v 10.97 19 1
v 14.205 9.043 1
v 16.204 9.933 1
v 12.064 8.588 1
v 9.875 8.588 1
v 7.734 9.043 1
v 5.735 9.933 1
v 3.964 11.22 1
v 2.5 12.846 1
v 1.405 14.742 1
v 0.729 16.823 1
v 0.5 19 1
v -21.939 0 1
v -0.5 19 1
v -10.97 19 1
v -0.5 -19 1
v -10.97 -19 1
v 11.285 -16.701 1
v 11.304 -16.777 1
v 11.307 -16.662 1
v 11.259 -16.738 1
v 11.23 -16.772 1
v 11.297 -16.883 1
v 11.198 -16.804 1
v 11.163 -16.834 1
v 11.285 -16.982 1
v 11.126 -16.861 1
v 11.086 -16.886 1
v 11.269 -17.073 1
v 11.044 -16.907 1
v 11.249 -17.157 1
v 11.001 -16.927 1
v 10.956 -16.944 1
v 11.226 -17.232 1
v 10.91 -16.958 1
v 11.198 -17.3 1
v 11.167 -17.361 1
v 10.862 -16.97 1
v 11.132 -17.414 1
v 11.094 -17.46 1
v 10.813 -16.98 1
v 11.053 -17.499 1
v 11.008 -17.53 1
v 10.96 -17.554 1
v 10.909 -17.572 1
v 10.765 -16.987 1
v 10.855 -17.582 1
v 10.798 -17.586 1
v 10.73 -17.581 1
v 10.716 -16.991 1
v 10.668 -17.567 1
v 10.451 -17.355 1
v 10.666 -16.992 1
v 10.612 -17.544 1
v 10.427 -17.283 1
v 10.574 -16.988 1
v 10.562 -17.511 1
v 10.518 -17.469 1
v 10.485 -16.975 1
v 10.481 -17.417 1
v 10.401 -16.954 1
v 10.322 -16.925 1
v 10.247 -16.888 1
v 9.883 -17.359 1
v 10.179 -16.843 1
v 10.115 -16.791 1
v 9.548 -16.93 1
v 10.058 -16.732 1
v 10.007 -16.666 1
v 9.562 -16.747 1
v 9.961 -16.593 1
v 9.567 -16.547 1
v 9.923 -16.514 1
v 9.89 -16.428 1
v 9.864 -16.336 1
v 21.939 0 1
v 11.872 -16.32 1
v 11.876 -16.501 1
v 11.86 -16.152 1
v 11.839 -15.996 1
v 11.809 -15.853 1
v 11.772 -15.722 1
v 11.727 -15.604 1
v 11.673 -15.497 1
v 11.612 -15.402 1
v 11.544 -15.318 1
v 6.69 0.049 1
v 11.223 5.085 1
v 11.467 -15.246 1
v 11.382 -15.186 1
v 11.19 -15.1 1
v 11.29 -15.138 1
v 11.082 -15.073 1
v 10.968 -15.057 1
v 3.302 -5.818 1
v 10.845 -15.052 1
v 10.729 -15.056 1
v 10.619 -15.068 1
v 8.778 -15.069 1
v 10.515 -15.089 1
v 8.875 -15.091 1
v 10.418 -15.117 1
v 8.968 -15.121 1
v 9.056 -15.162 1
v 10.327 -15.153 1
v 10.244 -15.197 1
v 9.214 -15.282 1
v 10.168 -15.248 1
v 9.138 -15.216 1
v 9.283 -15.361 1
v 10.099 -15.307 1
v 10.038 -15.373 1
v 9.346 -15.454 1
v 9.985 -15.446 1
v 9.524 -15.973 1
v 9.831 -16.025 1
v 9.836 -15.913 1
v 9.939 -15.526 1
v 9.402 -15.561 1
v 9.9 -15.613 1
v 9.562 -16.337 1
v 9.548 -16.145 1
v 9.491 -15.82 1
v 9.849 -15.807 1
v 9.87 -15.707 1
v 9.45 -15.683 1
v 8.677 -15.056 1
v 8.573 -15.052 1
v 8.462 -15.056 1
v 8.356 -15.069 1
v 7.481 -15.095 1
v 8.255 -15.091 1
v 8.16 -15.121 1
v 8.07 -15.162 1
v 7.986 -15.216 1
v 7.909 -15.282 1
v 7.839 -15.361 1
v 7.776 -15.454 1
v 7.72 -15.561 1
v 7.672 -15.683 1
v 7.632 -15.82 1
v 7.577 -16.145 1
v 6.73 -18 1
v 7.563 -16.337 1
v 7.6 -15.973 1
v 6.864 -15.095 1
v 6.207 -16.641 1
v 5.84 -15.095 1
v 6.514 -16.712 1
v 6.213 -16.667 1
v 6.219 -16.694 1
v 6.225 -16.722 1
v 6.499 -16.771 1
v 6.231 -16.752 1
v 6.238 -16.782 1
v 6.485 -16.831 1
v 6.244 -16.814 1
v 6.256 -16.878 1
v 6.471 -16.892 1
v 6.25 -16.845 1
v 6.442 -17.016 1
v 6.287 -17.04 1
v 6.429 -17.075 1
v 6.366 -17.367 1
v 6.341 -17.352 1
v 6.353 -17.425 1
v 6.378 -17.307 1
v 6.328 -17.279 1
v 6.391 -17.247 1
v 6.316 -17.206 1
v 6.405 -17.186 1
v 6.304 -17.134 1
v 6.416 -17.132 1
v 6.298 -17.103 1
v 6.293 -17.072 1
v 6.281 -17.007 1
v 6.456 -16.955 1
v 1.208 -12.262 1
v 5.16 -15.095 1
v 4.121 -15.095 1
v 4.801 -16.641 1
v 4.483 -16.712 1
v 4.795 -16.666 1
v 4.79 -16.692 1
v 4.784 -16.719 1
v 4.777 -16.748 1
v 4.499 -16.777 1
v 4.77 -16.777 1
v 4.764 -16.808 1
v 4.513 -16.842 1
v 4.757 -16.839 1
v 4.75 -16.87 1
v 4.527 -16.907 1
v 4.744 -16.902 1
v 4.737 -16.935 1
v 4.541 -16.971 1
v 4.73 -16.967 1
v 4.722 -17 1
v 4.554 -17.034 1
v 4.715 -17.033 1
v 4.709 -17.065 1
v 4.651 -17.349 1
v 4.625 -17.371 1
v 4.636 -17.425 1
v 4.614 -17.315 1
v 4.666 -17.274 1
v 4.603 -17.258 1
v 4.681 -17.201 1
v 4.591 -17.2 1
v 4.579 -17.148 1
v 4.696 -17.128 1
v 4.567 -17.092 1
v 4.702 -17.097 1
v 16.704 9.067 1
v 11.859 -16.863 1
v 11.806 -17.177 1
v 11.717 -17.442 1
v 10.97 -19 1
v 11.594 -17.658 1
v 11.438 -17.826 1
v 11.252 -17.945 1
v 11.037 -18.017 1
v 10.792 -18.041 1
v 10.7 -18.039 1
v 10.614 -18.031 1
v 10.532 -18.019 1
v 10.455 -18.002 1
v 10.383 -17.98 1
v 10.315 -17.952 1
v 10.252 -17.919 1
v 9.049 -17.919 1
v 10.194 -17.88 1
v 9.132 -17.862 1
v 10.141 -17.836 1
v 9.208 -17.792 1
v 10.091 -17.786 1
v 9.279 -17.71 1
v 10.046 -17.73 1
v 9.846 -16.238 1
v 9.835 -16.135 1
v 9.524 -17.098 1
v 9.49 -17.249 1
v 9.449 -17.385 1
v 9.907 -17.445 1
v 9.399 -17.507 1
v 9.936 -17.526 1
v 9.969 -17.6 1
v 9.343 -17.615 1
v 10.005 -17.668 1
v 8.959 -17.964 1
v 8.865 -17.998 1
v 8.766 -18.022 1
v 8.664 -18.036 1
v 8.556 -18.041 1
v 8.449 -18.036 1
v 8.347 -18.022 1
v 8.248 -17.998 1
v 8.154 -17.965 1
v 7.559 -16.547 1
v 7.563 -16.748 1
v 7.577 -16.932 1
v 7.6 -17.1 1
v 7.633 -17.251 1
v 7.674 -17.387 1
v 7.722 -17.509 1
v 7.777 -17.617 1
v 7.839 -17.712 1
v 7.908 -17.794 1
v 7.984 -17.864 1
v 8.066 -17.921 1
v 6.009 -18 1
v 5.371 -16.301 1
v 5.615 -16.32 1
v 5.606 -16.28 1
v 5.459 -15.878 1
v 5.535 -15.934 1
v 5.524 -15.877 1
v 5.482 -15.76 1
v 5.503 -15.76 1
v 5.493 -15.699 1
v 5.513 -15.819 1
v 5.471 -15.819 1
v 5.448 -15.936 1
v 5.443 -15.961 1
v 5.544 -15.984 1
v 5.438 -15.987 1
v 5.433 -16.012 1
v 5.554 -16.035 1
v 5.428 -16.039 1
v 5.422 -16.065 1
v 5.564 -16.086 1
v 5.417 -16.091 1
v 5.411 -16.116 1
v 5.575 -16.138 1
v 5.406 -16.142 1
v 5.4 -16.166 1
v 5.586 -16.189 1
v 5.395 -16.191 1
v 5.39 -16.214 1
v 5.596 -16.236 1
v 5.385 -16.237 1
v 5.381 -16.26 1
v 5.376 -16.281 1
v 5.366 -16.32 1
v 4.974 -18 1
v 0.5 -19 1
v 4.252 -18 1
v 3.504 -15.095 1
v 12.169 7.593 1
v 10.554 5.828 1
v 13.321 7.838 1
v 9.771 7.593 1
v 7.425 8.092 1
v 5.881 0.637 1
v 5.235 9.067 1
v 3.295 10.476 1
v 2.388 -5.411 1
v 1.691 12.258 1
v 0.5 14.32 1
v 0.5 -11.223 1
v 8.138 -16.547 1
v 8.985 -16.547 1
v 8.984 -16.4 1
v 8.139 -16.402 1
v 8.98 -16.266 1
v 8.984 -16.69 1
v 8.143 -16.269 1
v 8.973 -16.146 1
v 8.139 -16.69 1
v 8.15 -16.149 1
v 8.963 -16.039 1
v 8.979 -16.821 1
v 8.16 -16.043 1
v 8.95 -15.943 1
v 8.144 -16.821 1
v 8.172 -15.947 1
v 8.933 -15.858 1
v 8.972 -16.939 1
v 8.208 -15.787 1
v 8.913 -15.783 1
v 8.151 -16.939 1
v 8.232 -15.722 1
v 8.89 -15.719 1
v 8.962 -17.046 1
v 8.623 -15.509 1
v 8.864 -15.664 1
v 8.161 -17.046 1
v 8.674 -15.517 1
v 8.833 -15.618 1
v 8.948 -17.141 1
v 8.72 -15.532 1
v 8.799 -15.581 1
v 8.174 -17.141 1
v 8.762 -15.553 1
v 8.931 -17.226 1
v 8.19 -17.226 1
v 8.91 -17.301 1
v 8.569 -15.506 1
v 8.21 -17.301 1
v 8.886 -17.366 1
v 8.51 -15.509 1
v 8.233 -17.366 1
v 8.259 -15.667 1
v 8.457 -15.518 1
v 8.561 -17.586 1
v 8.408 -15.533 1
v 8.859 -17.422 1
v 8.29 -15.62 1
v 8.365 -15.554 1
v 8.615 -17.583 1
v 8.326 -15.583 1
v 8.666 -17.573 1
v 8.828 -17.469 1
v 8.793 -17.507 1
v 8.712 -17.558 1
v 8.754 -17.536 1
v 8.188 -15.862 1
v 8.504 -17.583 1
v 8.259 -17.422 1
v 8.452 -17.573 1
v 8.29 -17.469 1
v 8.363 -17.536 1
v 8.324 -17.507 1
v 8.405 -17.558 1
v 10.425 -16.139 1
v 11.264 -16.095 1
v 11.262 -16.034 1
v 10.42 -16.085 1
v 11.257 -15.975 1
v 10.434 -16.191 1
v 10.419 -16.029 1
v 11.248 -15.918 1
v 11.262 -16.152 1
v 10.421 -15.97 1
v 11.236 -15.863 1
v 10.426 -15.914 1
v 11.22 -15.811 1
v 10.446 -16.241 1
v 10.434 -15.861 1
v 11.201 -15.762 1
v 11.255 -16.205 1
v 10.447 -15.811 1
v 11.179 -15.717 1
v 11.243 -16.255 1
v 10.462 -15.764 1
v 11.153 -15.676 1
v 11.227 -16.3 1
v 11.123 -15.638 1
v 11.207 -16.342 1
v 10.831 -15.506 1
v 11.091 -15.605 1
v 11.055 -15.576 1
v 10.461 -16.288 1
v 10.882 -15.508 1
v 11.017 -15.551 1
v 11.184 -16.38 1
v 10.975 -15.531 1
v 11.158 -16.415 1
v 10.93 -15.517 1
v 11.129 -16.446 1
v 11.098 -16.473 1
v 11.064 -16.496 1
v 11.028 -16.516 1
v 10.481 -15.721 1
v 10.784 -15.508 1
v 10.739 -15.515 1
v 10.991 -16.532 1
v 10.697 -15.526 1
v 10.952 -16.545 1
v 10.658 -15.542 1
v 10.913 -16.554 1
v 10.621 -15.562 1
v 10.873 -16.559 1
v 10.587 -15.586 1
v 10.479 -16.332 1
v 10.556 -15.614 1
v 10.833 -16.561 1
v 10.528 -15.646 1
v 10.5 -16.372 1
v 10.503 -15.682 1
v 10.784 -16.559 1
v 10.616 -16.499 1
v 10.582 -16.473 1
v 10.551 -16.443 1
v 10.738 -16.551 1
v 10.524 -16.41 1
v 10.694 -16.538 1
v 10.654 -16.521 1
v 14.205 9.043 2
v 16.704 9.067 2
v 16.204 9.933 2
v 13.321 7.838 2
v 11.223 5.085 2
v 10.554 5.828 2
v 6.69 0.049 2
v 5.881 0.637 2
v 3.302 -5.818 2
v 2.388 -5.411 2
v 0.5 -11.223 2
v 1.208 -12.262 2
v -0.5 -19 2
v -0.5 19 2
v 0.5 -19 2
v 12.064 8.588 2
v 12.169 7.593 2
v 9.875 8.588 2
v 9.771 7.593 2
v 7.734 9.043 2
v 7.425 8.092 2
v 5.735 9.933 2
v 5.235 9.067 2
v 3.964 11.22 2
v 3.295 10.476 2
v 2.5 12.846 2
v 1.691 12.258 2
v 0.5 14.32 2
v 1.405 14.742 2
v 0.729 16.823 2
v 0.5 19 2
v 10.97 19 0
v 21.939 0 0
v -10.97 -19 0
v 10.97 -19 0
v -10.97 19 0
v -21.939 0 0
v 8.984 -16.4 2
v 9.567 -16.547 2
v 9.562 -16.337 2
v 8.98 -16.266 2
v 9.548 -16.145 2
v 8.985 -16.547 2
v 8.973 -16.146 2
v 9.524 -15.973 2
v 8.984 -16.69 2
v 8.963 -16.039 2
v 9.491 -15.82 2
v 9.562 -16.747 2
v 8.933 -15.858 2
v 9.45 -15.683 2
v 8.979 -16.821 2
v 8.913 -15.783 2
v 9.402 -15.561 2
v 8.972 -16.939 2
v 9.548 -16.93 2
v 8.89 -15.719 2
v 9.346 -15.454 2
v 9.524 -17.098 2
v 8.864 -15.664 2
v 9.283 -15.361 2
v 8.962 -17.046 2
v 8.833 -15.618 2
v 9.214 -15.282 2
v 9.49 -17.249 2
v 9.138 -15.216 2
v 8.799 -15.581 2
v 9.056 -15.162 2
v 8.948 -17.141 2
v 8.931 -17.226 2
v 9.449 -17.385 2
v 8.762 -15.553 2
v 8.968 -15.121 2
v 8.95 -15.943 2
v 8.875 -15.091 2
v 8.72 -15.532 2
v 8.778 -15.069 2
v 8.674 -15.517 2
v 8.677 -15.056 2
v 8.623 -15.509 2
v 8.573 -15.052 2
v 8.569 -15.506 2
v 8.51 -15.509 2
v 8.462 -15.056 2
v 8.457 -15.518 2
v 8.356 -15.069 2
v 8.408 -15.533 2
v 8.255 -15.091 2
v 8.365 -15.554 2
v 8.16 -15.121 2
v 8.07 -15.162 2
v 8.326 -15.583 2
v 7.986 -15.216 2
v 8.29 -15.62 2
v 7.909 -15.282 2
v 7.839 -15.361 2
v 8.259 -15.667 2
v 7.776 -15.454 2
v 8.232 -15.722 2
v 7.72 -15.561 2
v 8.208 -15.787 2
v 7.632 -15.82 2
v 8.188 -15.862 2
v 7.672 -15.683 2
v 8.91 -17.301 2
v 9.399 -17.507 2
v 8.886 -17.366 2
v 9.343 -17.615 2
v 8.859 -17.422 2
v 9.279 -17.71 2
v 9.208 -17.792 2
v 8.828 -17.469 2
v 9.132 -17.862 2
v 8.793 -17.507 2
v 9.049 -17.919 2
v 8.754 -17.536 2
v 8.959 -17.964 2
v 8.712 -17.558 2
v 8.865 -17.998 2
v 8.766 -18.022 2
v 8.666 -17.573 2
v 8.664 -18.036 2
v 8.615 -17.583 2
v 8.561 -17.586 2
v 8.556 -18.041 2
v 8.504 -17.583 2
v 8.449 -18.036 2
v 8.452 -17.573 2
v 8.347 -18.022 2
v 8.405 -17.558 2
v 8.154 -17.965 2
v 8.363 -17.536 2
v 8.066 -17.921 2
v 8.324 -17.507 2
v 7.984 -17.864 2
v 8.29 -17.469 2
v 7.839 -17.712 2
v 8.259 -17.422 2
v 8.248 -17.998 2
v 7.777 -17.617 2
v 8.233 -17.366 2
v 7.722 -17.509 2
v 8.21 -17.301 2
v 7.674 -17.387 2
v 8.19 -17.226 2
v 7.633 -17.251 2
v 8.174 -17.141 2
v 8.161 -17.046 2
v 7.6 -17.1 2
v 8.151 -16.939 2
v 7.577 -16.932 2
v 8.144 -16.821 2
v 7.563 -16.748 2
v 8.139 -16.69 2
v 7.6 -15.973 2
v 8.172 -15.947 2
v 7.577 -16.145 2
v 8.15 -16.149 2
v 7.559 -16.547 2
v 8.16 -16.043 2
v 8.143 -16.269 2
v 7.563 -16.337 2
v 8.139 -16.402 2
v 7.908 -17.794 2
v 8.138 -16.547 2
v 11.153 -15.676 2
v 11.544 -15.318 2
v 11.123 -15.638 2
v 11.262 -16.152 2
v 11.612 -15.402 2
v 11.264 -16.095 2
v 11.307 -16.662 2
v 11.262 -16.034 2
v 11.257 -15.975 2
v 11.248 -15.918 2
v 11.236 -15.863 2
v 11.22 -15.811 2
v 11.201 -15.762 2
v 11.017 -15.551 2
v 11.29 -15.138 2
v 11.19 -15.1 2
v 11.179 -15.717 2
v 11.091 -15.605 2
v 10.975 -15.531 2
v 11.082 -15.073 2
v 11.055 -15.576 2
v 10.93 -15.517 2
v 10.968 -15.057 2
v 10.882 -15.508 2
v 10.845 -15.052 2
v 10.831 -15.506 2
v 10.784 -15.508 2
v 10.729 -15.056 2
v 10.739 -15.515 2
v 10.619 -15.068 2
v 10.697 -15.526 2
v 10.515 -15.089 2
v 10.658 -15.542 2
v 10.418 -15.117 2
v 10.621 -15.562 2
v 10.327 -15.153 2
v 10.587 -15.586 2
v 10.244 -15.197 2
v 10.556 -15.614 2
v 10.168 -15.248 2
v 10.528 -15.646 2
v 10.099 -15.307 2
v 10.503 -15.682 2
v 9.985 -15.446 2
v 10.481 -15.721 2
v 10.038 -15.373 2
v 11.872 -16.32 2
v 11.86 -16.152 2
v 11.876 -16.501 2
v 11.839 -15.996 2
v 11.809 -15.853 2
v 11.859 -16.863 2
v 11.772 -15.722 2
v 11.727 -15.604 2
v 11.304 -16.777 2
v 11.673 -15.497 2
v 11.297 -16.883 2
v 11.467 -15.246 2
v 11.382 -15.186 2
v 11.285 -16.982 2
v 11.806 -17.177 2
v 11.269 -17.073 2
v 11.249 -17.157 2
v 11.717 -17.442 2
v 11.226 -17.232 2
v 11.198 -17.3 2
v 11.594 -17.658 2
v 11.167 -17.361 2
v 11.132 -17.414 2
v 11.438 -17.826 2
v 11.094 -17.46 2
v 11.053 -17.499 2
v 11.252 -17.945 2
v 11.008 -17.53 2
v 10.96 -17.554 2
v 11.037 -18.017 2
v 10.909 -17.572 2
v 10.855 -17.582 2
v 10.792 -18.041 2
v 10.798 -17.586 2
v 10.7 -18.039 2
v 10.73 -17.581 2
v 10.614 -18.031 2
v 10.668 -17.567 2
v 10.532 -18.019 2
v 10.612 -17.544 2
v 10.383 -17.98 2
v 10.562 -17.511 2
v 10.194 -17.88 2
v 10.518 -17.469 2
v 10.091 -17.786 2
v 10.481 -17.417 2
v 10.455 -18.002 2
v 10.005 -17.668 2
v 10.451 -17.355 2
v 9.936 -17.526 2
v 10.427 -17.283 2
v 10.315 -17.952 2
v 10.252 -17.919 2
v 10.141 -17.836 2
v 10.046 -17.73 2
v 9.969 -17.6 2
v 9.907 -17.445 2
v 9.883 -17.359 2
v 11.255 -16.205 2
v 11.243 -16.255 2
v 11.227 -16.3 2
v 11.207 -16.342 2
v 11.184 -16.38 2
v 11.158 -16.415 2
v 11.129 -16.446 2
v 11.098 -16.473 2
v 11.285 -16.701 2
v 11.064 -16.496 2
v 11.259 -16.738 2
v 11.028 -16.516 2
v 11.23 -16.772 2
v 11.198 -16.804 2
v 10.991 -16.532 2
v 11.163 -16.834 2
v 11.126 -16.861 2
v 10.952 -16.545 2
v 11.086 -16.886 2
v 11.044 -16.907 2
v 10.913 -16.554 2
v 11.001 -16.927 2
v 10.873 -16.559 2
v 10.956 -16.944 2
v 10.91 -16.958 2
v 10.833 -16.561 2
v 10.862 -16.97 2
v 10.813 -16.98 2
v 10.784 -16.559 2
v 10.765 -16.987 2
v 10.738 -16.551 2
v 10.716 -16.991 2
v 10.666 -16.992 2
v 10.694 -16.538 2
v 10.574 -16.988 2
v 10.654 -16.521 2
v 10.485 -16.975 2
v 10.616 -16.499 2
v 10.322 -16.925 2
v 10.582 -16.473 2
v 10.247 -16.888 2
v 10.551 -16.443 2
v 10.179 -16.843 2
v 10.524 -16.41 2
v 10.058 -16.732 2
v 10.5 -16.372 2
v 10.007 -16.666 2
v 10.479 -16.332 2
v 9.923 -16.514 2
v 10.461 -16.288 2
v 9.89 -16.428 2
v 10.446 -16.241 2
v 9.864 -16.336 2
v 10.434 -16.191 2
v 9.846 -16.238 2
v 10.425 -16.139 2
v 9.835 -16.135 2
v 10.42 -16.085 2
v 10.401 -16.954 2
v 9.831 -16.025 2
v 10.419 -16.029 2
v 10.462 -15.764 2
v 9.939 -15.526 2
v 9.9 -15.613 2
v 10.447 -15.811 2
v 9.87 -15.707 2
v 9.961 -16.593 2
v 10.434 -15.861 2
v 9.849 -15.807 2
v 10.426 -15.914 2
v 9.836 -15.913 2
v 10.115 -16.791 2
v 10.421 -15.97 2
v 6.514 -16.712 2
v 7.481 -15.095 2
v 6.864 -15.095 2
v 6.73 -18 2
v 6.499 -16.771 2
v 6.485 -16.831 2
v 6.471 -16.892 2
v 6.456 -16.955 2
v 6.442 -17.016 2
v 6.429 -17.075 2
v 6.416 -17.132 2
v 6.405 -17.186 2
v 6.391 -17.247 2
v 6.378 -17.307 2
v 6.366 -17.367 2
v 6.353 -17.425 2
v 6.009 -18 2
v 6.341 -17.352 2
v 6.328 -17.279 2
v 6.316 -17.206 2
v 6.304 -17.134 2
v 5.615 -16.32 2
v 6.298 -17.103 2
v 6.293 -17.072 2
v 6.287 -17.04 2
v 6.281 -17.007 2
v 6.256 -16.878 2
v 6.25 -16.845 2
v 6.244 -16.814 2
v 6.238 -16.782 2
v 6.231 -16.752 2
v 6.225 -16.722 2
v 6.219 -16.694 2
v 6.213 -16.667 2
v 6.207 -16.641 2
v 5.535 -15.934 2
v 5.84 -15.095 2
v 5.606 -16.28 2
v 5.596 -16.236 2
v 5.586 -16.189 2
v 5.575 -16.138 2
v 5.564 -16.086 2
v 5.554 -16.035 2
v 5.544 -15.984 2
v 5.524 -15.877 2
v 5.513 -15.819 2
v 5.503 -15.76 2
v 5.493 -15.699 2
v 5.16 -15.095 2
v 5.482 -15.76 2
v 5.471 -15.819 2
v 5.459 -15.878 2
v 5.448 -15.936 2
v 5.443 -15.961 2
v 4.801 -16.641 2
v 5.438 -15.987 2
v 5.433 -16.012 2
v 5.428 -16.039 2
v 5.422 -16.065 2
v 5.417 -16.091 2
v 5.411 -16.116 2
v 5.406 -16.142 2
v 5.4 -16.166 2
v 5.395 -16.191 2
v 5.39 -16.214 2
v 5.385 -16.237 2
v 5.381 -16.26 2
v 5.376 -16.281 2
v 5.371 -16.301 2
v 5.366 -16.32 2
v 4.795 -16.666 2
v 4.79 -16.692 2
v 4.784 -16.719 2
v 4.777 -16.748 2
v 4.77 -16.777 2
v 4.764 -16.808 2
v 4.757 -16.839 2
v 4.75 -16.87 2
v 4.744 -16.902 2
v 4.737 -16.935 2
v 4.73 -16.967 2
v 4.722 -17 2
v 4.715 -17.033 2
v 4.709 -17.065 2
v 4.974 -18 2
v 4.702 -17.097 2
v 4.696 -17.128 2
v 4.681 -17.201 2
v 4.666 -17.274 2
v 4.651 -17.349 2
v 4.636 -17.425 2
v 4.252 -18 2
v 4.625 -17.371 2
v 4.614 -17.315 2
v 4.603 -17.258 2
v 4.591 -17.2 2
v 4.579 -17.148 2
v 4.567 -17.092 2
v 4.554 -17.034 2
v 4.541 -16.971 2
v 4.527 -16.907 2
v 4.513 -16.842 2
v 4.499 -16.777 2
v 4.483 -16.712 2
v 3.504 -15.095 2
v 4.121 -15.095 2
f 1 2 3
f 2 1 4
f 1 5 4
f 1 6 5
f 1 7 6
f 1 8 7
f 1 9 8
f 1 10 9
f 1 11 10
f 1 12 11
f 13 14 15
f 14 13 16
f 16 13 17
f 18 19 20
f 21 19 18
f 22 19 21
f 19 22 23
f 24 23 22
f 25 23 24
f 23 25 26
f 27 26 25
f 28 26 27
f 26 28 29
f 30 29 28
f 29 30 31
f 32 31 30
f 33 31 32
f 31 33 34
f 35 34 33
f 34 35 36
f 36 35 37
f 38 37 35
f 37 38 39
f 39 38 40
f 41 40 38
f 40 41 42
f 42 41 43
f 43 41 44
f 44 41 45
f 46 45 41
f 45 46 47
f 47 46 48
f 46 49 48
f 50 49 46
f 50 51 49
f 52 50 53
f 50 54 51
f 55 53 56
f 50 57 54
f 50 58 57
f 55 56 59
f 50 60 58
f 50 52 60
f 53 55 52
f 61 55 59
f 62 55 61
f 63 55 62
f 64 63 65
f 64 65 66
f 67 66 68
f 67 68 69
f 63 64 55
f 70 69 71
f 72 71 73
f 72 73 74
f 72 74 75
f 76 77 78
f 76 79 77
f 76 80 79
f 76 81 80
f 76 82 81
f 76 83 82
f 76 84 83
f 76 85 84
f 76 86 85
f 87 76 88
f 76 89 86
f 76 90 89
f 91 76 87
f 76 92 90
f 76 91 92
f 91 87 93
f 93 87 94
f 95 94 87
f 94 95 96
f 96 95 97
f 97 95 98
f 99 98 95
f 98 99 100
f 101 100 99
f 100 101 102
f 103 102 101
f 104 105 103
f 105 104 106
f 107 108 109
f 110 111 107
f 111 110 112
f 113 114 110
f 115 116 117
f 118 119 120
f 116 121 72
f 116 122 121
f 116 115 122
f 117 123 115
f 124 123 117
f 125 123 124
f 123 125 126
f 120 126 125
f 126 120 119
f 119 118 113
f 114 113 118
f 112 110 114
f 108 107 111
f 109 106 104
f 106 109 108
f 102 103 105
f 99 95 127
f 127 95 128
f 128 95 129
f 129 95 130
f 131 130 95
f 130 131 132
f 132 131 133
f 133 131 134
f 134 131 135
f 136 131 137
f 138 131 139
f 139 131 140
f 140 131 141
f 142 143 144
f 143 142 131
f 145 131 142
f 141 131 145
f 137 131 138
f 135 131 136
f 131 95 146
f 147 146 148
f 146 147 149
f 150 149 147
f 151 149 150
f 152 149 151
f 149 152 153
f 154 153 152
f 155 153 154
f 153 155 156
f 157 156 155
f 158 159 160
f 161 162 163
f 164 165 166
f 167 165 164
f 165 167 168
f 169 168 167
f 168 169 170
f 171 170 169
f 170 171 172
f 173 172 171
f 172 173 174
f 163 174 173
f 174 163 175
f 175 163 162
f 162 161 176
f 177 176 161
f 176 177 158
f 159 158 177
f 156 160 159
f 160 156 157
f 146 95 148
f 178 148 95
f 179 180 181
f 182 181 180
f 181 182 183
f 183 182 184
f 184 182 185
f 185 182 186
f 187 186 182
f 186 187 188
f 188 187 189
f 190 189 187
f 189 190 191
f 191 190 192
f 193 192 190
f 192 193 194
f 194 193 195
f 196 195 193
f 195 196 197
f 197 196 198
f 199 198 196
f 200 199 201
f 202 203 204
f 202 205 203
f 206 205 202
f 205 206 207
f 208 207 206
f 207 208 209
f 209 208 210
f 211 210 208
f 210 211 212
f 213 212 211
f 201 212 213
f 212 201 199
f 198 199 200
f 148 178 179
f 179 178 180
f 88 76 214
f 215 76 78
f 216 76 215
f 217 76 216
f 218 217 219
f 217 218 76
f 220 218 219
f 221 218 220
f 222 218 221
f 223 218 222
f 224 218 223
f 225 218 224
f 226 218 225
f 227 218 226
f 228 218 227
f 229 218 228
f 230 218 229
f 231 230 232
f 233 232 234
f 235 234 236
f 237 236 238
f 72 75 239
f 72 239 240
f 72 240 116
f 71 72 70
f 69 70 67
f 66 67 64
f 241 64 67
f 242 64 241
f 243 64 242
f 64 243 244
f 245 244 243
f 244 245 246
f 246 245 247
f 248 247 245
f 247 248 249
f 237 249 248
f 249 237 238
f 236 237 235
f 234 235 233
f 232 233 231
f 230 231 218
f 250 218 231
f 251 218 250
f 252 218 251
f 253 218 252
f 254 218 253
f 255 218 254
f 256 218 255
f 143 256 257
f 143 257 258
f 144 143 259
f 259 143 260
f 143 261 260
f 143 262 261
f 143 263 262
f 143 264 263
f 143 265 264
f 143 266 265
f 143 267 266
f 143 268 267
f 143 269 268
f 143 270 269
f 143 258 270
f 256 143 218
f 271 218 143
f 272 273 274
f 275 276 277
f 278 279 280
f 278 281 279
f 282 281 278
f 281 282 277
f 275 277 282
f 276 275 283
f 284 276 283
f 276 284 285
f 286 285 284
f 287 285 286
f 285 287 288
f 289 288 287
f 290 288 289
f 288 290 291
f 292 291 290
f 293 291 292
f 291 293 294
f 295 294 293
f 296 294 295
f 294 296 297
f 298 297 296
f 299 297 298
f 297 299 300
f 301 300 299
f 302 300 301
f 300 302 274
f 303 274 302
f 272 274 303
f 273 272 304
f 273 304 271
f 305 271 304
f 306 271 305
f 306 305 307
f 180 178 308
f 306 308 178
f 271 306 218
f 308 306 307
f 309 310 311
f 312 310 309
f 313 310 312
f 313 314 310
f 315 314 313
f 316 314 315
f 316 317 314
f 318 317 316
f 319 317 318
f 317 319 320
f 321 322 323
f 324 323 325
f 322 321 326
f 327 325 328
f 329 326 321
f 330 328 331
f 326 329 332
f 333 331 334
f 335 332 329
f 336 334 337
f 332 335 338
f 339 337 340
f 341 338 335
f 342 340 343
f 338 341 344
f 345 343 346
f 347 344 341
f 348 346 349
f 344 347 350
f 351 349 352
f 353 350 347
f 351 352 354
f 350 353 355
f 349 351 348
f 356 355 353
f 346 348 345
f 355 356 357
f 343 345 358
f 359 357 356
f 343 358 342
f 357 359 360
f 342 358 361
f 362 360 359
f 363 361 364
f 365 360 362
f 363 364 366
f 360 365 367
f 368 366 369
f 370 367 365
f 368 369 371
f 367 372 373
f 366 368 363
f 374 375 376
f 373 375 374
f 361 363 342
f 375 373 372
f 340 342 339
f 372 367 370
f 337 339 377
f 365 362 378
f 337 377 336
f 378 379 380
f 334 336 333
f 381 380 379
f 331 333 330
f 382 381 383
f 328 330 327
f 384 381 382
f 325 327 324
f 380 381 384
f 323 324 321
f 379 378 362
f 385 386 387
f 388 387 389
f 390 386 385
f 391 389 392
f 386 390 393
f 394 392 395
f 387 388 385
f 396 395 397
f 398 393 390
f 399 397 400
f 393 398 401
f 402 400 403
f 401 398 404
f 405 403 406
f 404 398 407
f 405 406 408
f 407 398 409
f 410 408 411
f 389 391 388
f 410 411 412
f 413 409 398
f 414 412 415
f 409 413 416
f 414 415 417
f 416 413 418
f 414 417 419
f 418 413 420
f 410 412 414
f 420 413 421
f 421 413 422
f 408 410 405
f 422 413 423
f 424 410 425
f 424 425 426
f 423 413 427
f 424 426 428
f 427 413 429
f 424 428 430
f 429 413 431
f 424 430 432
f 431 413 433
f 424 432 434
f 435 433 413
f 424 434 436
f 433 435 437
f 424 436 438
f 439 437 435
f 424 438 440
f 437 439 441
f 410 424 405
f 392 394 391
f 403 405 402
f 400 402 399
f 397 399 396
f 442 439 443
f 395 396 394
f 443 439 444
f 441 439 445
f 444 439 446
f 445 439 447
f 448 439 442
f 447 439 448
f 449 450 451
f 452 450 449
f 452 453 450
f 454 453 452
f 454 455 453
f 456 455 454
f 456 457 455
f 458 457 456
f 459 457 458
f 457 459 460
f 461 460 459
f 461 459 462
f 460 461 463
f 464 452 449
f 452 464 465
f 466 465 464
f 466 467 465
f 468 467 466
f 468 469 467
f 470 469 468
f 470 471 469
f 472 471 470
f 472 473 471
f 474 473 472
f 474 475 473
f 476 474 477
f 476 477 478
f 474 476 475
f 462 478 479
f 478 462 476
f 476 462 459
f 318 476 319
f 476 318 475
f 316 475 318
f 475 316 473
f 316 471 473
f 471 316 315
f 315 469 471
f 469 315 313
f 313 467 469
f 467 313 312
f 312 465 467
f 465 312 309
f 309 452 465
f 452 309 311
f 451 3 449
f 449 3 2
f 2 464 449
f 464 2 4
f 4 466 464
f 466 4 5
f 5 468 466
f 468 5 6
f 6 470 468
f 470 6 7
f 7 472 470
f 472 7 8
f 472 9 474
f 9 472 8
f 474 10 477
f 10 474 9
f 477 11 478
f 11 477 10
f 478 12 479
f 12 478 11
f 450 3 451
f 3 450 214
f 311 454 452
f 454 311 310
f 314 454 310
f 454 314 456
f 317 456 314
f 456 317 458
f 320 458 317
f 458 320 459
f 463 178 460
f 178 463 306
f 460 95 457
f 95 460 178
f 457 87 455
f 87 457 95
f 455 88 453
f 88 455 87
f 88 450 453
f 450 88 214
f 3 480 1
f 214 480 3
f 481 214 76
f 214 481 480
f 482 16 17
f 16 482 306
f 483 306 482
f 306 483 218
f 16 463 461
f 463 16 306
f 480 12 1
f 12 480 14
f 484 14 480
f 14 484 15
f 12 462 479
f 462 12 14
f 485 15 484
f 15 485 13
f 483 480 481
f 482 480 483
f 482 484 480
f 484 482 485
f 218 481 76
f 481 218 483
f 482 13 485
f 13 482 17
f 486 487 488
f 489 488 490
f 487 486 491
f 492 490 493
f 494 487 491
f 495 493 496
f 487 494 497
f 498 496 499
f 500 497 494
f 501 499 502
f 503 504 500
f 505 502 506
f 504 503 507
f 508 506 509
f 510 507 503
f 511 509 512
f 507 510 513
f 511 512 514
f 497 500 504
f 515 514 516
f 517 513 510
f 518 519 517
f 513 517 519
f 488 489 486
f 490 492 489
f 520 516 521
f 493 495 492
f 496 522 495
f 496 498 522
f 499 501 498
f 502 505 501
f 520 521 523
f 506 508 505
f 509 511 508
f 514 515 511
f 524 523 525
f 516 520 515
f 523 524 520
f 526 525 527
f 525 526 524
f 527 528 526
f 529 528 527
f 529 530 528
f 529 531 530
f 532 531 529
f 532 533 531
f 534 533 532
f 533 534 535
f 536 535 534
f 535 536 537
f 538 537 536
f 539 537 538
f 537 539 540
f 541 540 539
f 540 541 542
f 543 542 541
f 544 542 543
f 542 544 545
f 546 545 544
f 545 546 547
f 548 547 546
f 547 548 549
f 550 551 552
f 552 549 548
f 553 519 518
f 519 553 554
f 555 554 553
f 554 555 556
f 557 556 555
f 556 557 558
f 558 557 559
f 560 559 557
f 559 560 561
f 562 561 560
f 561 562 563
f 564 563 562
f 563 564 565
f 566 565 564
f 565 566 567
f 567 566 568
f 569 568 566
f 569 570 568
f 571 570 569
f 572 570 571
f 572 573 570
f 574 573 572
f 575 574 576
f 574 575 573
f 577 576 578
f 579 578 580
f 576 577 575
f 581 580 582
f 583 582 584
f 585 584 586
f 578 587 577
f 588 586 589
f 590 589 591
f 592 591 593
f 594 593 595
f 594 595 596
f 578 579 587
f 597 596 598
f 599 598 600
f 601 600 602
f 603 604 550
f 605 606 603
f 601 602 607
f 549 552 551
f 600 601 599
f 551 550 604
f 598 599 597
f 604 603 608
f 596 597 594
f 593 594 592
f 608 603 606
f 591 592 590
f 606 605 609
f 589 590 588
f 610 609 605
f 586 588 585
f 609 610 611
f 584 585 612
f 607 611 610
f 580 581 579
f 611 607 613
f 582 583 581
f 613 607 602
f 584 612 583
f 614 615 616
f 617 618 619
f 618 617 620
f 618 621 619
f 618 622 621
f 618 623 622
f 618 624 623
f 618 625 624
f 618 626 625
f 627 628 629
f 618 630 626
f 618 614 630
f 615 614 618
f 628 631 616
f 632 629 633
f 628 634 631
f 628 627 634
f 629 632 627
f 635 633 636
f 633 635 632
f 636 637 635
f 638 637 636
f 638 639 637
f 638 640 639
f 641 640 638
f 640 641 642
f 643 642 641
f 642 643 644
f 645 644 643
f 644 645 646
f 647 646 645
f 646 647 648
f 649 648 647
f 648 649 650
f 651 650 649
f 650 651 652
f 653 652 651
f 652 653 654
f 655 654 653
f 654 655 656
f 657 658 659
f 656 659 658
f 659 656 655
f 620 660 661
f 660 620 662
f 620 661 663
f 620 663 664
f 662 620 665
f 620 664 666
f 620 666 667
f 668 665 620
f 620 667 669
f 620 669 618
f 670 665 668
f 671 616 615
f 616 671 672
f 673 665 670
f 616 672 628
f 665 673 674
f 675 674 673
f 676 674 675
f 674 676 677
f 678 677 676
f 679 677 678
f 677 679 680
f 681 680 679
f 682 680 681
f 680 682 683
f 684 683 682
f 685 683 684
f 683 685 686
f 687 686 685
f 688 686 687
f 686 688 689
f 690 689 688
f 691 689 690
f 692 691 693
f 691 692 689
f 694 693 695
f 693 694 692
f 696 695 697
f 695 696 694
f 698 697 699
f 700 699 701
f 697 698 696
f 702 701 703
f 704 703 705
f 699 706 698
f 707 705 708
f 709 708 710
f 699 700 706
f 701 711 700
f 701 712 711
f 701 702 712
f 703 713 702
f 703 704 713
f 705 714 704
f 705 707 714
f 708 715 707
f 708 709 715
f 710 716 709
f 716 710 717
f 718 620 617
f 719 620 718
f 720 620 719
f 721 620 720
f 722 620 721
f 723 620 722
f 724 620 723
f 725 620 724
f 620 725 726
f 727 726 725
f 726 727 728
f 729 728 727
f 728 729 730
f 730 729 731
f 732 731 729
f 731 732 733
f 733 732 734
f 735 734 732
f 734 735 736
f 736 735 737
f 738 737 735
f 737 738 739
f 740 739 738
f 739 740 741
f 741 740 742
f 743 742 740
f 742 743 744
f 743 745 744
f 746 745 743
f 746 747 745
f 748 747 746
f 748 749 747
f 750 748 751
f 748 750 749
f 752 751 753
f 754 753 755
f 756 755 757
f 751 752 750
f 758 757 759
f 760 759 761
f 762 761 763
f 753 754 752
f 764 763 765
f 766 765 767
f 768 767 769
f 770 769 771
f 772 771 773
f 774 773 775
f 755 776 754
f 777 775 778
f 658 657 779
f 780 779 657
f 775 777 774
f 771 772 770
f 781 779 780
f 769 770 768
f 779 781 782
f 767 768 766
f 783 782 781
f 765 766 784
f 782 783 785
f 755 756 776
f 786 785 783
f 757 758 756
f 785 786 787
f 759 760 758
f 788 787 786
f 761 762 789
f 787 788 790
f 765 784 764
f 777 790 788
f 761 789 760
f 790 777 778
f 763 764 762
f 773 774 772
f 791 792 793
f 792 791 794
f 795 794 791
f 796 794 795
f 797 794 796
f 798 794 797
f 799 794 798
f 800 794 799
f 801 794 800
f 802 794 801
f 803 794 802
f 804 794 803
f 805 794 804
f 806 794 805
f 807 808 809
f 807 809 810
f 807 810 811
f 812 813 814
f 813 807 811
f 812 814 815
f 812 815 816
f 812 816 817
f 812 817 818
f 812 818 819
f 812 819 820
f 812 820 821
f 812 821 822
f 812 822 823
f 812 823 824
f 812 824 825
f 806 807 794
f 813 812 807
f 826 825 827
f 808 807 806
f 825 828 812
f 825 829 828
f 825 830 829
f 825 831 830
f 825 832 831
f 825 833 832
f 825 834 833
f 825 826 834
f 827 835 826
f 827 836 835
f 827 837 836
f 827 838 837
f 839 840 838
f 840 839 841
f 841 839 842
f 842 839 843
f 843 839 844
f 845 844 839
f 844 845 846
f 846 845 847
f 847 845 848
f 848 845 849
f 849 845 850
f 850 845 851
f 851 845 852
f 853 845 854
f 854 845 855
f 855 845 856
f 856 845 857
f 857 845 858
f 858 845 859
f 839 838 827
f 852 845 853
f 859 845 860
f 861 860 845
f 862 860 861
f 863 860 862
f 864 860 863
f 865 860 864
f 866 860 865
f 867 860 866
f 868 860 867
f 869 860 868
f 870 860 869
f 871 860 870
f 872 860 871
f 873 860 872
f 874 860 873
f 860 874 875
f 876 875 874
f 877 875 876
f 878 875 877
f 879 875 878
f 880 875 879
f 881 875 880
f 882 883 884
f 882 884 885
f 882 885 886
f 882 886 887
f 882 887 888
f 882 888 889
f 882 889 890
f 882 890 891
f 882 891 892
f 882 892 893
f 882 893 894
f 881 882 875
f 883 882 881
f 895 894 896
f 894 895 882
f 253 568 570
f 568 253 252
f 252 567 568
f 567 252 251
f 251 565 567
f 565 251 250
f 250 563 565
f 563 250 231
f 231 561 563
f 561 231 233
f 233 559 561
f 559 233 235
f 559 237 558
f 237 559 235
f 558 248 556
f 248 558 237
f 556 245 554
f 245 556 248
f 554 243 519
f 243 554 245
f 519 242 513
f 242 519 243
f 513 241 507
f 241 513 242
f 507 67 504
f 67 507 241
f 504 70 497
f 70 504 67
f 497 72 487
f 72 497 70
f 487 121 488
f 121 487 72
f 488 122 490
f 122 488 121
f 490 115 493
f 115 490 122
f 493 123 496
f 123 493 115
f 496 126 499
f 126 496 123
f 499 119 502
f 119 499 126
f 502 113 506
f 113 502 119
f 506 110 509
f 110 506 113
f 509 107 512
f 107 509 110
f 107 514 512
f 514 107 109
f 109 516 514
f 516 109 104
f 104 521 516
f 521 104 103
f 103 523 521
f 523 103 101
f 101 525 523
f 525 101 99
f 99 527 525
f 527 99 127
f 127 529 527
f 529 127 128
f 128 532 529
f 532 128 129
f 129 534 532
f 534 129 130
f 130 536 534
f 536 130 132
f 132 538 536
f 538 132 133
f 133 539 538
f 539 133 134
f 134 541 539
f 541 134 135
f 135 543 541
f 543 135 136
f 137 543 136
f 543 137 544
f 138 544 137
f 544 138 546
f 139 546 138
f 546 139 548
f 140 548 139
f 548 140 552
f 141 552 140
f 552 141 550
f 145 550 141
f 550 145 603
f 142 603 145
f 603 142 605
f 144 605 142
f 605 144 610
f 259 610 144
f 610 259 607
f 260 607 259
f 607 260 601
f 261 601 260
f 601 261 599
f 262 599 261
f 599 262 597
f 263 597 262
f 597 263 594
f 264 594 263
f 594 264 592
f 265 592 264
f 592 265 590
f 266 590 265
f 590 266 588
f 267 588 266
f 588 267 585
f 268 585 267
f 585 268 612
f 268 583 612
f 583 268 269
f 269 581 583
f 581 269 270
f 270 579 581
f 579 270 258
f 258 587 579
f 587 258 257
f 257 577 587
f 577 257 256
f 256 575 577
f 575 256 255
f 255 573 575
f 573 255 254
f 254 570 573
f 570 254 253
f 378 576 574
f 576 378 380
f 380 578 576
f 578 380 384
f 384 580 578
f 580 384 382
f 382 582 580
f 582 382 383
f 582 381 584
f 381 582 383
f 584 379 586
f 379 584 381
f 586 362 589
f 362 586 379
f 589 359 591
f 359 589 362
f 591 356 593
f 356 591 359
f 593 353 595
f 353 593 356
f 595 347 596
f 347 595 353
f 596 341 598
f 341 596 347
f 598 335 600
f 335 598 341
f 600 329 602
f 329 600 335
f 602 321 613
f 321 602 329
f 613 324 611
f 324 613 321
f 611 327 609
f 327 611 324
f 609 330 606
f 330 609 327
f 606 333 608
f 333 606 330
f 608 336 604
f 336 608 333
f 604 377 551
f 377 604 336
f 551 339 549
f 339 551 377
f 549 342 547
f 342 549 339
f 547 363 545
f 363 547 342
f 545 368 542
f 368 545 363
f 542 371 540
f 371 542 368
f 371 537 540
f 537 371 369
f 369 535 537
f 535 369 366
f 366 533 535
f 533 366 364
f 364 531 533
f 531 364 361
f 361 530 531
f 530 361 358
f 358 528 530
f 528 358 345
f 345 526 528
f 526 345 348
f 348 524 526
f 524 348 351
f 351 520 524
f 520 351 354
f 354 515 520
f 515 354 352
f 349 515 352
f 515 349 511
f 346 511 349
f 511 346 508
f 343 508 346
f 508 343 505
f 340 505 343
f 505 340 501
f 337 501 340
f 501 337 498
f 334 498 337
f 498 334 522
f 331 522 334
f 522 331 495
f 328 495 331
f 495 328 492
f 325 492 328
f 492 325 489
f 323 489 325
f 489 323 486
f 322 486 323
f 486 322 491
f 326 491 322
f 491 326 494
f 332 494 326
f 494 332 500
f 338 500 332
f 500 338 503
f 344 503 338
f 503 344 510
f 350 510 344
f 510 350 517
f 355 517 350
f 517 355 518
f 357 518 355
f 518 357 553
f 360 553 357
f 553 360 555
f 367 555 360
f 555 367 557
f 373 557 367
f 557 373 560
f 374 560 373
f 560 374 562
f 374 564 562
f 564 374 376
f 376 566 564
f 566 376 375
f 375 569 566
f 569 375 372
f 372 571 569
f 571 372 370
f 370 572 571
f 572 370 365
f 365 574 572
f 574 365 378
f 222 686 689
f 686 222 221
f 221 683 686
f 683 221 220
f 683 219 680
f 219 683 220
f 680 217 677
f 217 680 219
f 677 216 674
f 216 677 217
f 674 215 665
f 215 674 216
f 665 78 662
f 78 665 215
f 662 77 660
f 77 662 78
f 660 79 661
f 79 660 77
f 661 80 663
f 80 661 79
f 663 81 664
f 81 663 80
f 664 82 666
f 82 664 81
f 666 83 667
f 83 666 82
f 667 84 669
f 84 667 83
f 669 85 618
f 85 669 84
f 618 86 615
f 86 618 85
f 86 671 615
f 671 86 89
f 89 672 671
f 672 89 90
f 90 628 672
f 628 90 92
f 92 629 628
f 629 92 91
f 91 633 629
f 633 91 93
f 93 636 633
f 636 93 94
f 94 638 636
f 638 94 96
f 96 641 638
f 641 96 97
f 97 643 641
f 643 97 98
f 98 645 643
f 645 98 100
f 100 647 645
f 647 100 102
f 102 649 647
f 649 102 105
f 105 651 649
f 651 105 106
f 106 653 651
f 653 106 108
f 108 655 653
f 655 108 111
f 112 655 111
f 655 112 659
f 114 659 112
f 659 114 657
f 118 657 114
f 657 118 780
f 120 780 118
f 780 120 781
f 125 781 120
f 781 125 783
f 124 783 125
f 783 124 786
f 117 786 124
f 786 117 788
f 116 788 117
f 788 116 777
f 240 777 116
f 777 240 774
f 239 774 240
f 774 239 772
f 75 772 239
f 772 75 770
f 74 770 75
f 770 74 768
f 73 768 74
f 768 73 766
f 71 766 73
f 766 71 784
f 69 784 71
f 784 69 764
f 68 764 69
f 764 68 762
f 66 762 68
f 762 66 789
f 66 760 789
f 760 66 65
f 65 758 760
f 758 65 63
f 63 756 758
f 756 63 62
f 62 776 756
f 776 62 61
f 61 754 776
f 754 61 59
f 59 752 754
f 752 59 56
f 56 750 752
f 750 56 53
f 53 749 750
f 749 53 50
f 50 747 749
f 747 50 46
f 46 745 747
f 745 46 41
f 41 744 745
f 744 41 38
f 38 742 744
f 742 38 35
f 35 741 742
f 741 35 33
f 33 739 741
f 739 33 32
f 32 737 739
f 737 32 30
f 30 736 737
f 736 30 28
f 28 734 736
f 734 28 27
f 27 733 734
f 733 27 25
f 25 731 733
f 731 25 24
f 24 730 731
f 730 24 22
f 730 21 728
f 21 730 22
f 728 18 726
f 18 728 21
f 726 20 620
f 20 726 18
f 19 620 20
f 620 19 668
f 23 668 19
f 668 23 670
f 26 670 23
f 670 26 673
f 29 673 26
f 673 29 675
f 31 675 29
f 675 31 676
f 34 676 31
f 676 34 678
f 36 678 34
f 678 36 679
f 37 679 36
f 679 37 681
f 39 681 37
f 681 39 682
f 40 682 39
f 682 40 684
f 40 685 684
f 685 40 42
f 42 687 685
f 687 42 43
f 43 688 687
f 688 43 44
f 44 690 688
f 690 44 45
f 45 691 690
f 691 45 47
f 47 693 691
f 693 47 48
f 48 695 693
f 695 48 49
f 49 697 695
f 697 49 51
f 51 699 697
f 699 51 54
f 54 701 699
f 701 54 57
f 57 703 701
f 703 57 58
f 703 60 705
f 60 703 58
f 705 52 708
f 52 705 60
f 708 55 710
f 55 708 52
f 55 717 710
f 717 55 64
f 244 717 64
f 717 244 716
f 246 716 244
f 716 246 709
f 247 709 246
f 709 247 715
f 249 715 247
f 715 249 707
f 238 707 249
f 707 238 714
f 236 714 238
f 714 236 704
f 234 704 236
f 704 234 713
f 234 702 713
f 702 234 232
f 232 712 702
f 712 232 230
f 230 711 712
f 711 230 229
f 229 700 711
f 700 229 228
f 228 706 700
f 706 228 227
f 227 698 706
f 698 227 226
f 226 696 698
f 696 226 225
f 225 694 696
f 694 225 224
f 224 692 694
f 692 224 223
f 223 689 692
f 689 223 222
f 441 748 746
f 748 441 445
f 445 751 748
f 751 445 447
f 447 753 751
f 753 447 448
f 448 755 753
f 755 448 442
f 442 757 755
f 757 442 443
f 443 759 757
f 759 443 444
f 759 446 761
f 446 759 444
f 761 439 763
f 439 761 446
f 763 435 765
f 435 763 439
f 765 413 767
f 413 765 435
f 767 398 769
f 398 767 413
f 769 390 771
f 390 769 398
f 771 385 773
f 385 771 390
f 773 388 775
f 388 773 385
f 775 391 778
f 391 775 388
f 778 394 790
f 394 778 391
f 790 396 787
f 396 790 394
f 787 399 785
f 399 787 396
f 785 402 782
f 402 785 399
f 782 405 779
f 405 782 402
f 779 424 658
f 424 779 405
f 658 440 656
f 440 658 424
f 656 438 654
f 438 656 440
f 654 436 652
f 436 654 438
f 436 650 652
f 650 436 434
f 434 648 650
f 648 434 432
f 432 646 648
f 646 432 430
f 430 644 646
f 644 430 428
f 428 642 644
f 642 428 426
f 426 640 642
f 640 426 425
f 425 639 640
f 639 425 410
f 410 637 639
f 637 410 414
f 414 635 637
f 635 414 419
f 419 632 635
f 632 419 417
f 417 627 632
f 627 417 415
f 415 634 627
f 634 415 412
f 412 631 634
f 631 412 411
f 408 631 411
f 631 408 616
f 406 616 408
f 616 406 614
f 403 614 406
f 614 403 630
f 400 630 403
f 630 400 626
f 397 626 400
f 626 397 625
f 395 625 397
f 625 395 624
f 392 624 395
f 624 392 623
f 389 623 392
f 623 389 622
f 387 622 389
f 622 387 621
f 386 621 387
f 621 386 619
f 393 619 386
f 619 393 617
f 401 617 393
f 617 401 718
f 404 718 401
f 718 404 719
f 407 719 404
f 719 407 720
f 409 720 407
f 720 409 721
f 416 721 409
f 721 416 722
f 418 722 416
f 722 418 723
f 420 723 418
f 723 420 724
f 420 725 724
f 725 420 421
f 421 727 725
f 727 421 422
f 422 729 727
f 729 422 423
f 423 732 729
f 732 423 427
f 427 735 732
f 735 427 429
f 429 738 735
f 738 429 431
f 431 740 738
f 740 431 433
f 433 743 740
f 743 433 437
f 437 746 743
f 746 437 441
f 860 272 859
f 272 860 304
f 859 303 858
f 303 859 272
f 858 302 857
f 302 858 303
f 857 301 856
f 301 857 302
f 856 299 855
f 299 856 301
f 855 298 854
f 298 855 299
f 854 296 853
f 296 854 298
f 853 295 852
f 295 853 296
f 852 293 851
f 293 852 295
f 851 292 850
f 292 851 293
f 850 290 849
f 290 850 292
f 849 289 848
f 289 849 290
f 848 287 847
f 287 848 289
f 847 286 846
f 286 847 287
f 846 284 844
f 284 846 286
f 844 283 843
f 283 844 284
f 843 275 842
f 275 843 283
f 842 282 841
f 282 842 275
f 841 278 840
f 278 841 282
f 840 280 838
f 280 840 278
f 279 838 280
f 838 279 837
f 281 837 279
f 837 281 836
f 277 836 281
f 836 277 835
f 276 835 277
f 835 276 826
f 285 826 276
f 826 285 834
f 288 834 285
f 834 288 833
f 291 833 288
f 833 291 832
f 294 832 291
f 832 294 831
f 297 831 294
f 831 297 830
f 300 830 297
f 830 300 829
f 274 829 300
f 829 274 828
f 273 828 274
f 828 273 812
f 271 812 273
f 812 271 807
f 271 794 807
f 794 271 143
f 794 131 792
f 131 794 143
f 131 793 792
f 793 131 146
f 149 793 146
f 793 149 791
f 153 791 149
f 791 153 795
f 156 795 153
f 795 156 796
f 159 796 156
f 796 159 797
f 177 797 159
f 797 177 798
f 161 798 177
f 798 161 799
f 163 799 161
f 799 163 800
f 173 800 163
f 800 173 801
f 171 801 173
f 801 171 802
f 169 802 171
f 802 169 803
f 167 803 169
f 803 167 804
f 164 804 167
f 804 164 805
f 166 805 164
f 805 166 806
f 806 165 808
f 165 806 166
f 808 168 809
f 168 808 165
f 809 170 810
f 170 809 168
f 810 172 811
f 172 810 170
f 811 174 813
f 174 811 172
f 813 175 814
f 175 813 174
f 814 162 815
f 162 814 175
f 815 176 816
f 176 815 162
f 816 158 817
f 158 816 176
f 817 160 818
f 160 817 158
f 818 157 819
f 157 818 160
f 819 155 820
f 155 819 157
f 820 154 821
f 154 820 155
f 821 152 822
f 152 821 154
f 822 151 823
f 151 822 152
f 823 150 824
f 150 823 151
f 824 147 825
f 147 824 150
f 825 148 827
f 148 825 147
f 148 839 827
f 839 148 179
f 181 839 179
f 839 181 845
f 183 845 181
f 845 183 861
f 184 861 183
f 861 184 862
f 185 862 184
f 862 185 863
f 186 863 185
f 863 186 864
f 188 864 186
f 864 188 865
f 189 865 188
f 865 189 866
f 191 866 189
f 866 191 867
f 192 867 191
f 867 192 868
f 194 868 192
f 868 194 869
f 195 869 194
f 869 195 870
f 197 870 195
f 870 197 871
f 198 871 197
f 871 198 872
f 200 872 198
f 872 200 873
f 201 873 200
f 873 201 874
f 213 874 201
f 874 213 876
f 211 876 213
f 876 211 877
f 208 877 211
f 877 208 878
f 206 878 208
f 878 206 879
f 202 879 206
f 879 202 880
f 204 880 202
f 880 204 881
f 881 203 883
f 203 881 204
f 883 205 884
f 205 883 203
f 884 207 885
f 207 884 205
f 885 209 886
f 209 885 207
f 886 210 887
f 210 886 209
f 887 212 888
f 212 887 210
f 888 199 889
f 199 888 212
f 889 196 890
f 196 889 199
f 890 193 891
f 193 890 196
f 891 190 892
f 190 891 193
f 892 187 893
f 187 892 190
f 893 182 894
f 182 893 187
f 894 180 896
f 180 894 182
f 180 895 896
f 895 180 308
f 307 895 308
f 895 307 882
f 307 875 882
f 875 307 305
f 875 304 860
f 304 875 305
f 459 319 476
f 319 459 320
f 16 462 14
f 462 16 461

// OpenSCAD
include <../../Scripts/18xx tiles basic functions.scad>
hex("blue");
put_tilenr("W09");

sharp_curve(2);
light_curve(0);
straight_line(0);
//put_value_blue("10",30);
//single_city([1,2,4,5],"GWR");
